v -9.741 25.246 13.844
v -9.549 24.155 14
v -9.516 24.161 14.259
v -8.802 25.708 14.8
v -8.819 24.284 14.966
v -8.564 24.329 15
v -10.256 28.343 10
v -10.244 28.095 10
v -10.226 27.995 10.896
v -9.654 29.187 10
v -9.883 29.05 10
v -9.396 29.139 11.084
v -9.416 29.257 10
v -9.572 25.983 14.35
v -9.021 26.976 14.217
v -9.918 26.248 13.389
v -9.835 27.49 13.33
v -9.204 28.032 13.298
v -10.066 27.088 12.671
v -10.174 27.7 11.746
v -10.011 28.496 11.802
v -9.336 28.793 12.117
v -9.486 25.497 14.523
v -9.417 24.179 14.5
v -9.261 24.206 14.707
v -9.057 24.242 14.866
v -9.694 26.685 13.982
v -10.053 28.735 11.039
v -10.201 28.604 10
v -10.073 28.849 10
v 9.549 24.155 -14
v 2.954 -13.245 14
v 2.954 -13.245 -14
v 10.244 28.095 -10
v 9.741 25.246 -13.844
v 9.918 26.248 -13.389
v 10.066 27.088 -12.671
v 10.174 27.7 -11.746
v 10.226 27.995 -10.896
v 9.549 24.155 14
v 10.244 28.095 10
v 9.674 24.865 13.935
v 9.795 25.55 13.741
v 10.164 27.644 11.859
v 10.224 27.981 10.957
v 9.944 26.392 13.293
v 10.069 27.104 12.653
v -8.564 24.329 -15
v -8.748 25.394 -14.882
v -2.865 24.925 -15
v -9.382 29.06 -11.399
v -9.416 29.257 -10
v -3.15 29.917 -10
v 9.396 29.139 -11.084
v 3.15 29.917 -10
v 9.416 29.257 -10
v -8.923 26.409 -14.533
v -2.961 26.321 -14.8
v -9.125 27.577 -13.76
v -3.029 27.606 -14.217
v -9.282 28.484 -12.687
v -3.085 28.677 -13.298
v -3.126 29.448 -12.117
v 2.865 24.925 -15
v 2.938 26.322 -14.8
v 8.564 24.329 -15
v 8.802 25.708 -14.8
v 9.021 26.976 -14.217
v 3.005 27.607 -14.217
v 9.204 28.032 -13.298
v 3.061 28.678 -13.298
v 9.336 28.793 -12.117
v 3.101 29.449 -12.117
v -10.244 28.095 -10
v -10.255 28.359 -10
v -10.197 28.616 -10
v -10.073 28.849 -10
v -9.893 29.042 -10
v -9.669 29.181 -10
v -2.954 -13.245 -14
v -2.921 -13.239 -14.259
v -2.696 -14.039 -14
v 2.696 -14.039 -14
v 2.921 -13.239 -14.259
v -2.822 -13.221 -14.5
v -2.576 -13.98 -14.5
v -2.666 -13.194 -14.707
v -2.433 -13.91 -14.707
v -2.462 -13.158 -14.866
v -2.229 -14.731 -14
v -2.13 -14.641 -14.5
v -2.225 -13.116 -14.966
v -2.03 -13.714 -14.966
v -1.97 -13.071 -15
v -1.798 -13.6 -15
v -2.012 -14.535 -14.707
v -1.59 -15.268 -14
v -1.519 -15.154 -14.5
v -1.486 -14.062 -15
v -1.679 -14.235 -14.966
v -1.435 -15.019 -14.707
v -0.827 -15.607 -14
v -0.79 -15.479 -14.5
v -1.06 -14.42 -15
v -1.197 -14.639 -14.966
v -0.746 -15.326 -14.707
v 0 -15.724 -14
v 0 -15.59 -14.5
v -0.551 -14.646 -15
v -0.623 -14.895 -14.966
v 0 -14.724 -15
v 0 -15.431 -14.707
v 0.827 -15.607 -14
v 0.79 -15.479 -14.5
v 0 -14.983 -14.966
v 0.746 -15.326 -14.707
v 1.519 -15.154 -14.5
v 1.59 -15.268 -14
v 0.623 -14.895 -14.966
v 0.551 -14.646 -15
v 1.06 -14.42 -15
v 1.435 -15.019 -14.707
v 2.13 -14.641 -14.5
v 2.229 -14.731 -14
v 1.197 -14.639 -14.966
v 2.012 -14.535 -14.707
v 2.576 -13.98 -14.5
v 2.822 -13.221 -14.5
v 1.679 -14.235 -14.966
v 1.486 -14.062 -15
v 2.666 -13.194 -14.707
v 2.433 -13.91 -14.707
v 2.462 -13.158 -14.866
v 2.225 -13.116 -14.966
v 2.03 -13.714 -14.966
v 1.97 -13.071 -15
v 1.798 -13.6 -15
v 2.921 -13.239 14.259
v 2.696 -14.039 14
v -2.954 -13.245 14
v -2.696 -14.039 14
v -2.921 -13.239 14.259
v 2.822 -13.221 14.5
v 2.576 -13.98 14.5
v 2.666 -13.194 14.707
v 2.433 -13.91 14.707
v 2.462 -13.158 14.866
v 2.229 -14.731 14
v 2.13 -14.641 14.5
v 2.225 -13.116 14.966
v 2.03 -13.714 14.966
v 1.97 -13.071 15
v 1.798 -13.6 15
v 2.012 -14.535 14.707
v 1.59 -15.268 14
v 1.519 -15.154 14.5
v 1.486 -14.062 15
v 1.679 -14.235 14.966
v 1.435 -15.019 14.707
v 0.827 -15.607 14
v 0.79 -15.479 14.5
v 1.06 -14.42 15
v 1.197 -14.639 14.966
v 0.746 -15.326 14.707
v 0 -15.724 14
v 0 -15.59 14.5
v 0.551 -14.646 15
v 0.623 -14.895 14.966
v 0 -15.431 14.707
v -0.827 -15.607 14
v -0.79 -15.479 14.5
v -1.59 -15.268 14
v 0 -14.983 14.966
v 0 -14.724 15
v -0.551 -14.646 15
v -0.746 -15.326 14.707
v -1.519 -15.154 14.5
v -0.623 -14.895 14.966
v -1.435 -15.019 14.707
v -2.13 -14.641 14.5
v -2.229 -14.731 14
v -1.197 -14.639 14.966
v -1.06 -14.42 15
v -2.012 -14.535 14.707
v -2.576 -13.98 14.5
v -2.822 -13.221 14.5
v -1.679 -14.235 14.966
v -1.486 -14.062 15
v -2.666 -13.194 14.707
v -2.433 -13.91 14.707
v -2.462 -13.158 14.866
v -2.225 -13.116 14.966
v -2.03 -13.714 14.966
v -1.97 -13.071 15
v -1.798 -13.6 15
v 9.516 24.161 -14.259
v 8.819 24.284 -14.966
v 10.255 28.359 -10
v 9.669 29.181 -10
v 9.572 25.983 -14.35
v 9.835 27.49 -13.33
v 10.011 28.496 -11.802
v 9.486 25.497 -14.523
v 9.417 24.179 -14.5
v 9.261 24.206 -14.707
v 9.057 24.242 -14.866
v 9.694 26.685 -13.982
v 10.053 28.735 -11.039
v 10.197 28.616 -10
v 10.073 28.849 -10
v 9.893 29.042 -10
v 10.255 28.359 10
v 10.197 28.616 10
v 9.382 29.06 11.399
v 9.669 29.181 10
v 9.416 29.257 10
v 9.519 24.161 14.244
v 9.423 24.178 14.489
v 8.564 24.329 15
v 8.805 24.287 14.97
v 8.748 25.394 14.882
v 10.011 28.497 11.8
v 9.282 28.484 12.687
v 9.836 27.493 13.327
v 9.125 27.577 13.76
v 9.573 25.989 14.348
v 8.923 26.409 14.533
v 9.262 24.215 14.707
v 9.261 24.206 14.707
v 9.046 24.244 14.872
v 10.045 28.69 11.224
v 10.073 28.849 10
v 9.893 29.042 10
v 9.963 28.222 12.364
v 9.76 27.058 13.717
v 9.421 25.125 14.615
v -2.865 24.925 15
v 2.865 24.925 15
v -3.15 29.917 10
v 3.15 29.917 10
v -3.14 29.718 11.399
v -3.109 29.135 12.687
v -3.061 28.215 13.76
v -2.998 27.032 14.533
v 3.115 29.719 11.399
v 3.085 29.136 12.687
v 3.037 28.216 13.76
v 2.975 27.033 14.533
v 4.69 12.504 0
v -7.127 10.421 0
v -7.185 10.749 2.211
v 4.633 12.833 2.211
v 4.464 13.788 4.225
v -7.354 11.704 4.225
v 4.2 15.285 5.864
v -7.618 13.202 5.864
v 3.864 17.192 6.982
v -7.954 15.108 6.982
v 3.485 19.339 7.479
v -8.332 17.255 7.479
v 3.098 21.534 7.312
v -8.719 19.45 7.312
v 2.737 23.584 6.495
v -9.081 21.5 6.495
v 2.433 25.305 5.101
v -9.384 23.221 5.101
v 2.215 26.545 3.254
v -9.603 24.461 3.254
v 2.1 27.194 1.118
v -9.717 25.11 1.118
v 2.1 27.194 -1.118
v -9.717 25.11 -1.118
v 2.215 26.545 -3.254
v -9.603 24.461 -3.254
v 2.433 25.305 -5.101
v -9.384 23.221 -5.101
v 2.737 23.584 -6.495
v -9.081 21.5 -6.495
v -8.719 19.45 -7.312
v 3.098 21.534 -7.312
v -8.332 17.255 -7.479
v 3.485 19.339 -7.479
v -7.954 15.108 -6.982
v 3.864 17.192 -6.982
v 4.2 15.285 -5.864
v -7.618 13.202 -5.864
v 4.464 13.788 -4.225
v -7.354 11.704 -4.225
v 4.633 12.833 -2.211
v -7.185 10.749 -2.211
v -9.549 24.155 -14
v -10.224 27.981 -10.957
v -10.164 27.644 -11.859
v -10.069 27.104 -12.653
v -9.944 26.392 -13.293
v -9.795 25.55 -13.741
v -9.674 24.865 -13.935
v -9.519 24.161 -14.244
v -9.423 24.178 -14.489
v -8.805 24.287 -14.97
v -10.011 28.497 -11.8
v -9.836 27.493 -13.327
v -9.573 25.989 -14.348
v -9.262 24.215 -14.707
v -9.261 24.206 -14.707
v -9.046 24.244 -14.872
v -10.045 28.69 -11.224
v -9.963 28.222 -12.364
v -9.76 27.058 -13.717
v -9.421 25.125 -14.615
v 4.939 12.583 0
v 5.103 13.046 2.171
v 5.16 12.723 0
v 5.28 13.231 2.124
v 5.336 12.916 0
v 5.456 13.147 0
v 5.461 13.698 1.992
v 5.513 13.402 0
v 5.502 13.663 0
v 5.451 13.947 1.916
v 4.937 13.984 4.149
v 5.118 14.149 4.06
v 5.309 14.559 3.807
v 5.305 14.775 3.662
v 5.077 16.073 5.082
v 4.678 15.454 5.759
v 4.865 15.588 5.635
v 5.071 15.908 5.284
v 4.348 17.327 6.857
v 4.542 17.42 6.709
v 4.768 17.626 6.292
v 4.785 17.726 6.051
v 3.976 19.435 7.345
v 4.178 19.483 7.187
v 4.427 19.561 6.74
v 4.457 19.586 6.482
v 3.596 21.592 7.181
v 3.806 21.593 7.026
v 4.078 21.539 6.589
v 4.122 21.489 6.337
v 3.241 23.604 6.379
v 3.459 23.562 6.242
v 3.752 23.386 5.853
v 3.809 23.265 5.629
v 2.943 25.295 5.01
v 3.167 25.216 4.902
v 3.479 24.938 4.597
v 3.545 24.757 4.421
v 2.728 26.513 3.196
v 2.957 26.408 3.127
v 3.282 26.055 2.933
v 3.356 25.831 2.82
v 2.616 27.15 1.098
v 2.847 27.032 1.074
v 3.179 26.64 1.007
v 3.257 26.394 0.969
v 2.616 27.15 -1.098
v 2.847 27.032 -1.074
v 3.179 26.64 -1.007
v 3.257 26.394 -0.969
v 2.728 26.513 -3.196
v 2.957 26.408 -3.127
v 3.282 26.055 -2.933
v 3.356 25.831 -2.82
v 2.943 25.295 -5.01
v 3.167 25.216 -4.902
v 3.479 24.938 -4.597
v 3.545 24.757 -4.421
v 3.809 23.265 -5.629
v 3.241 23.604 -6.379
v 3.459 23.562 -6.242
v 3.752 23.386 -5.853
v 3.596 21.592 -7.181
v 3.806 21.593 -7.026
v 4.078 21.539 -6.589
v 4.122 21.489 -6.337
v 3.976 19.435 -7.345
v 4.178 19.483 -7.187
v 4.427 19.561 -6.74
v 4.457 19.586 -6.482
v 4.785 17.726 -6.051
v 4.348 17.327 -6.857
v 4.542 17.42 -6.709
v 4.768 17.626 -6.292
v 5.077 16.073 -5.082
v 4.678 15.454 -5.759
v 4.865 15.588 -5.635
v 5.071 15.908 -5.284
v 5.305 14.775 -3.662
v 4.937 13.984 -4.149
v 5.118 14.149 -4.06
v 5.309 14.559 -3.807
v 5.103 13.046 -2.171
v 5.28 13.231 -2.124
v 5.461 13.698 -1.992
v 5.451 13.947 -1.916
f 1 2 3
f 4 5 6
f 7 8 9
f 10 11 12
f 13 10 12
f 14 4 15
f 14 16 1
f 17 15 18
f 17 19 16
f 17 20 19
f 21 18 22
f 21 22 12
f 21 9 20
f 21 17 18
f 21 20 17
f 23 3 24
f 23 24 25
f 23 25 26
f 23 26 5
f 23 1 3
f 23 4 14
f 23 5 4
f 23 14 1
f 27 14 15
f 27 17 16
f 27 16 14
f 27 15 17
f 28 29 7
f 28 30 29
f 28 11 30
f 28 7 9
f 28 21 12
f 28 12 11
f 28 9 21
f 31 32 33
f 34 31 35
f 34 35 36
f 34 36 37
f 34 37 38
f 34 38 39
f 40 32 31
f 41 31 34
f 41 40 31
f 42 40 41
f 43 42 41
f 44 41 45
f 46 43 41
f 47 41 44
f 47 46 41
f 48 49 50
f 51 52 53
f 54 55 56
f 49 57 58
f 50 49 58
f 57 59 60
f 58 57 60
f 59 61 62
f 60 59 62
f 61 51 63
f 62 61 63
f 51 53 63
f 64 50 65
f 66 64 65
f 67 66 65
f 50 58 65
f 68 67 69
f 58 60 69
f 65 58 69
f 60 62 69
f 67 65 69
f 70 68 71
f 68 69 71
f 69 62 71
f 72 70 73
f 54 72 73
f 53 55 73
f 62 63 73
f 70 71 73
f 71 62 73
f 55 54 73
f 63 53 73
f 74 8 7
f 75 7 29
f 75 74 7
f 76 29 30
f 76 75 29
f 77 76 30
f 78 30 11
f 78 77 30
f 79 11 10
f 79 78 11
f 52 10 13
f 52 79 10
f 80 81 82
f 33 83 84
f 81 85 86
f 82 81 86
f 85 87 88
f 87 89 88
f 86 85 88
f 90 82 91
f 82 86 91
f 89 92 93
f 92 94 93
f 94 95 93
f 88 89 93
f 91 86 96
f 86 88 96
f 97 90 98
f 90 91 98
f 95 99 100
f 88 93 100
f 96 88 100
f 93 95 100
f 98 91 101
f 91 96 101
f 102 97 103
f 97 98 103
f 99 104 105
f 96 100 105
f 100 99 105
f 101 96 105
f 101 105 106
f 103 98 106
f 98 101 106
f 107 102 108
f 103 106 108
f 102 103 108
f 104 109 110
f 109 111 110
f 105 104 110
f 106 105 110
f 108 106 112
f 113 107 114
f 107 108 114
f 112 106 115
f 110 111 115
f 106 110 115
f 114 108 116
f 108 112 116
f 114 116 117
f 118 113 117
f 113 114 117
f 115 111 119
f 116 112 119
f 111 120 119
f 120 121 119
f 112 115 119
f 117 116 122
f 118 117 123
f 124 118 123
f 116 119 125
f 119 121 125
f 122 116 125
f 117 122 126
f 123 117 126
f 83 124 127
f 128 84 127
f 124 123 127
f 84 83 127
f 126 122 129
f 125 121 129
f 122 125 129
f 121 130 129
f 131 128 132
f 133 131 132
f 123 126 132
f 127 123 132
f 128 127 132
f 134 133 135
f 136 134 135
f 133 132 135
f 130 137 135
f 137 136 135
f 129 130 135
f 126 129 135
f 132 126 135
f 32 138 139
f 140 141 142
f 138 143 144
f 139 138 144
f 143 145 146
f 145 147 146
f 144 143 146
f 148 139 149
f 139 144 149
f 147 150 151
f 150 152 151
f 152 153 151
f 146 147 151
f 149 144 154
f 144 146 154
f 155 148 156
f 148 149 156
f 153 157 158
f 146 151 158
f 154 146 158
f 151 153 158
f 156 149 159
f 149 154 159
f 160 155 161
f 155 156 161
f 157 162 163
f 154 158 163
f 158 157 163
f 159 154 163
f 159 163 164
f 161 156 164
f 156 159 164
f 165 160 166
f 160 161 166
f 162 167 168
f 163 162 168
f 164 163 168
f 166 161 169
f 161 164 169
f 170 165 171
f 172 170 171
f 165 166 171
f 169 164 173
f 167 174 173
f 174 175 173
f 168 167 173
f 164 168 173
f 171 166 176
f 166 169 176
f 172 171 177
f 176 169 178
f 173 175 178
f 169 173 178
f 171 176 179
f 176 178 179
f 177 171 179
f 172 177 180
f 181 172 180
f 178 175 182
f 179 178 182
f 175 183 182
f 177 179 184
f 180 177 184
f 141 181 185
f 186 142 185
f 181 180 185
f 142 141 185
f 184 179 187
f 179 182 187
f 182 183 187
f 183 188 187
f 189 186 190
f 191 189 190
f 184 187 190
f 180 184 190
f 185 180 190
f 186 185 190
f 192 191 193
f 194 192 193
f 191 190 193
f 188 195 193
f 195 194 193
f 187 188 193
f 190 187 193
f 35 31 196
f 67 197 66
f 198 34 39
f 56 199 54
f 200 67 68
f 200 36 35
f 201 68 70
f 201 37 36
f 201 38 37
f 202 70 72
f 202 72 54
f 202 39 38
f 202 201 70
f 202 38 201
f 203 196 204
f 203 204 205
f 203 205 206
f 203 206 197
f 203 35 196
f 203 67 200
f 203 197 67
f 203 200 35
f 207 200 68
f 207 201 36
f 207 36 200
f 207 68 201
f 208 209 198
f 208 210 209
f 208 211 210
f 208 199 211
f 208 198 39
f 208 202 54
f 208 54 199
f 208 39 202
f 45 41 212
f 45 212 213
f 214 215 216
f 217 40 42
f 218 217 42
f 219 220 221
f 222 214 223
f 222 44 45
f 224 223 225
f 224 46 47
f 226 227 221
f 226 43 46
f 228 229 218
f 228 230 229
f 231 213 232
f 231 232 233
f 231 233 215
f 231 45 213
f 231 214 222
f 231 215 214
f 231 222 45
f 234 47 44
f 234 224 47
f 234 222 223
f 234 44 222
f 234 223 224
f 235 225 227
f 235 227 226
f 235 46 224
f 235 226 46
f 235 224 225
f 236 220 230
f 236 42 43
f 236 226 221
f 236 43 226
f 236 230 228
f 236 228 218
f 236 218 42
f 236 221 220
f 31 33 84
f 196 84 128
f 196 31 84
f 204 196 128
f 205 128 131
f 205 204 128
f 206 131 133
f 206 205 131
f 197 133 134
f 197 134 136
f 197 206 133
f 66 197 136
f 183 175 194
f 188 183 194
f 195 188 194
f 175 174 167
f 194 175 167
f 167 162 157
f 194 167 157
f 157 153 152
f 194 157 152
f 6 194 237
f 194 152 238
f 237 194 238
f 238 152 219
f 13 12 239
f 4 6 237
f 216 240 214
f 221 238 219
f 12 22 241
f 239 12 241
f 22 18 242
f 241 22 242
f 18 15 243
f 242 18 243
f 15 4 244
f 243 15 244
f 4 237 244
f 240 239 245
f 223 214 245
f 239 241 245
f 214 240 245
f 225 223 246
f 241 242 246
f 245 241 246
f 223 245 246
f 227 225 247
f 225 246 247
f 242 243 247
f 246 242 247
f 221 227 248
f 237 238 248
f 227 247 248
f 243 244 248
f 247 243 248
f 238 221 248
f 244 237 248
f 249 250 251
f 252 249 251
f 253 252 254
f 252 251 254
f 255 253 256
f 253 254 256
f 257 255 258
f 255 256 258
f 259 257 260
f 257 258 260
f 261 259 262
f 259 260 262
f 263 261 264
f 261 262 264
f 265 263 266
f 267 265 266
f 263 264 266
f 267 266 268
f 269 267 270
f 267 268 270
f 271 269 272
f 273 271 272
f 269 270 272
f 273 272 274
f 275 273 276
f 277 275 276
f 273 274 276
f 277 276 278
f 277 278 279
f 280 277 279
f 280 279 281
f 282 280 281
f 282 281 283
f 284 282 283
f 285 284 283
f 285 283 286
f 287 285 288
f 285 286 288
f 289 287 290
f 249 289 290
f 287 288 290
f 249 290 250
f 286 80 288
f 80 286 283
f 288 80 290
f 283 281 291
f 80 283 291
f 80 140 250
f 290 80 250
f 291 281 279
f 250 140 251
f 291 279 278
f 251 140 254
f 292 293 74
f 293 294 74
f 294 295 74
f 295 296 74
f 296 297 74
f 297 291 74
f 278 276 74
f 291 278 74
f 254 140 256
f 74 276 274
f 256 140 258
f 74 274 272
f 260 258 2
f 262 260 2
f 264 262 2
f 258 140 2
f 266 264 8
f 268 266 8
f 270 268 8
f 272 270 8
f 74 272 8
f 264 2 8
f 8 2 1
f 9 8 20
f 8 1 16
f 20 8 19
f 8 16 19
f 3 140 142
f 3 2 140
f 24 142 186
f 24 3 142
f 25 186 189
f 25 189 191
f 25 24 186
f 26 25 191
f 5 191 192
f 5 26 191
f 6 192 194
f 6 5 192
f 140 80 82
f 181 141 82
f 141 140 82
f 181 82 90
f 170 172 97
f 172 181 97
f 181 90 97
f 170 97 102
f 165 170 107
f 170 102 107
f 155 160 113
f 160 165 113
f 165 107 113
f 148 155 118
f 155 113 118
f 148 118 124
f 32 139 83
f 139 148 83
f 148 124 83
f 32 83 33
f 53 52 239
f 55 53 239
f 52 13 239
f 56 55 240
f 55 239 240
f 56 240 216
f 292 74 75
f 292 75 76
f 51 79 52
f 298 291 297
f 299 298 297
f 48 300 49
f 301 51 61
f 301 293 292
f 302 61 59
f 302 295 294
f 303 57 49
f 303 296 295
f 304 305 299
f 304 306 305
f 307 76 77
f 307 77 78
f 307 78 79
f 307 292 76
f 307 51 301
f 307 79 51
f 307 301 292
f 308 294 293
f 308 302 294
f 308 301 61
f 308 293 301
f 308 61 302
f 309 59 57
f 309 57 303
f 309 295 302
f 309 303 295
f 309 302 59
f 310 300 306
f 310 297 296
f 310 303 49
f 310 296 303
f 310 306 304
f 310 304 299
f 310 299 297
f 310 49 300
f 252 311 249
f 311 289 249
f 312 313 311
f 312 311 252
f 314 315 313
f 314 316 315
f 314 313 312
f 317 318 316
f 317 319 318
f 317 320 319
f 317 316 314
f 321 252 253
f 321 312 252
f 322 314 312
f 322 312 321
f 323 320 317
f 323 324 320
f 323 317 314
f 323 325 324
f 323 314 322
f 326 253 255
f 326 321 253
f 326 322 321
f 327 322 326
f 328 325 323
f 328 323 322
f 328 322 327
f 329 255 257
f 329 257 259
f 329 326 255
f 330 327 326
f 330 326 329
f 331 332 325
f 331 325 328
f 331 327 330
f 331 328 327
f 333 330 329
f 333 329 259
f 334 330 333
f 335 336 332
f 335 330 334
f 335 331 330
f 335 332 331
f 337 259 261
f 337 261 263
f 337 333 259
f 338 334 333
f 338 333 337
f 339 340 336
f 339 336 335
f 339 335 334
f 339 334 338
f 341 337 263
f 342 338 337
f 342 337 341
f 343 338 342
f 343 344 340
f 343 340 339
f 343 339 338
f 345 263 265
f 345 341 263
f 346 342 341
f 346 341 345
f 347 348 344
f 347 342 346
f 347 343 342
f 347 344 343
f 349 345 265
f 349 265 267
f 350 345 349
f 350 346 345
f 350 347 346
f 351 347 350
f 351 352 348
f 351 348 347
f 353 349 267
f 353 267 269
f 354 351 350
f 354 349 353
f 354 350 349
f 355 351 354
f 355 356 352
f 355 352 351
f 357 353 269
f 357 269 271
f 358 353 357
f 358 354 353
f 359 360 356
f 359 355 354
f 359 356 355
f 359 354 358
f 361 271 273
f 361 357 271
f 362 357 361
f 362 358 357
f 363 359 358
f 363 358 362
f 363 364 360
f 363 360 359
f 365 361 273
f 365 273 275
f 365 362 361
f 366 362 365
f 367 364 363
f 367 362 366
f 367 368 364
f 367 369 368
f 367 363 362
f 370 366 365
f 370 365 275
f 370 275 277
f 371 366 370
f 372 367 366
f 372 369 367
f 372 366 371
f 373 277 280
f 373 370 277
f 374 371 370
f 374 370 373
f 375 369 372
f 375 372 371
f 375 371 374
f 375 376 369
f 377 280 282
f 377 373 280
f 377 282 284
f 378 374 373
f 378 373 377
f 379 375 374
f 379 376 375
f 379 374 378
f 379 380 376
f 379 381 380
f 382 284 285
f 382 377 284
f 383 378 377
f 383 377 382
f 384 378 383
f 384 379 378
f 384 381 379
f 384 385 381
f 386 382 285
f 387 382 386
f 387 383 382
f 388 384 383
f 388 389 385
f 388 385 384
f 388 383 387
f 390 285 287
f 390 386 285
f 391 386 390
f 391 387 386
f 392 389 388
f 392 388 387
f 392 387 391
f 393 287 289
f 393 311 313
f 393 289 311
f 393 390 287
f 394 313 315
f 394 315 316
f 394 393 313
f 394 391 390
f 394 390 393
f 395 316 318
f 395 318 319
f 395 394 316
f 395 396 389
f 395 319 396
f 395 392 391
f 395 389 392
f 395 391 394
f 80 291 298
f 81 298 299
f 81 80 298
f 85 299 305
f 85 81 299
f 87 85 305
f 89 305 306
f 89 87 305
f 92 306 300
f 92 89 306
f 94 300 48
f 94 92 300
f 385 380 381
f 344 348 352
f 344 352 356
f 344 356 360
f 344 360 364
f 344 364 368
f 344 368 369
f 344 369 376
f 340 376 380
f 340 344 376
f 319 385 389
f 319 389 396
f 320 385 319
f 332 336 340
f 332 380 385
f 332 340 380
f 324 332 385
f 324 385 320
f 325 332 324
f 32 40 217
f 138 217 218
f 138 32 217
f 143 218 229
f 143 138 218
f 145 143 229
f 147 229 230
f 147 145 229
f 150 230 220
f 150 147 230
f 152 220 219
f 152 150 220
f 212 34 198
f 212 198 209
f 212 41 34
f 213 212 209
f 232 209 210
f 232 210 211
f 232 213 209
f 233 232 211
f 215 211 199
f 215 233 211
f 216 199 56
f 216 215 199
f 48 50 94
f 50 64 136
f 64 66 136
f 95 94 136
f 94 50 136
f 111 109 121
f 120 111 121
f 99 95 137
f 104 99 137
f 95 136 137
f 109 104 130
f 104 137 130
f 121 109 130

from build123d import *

# Parameters (mm, degrees)
F1_ANGLE_BACK = 10
F1_ANGLE      = 20
F2_R          = 3
F3_R          = 7.5
F4_DEPTH      = 13
F5_R          = 1


with BuildPart() as f1:
    # F0 (on Right) → F1 (revolve)
    with BuildSketch(Plane.YZ, mode=Mode.PRIVATE) as f1_sk:
        with BuildLine():
            ThreePointArc((30, 10), (28.5355339059, 13.5355339059), (25, 15))
            Line((25, 15), (-30, 15))
            Line((-30, 15), (-30, -15))
            Line((-30, -15), (25, -15))
            ThreePointArc((25, -15), (28.5355339059, -13.5355339059), (30, -10))
            Line((30, -10), (30, 10))
        make_face()
    revolve(f1_sk.sketch.rotate(Axis((0, -30, 0), (0, 0, -1)), -F1_ANGLE_BACK), axis=Axis((0, -30, 0), (0, 0, -1)), revolution_arc=F1_ANGLE)

    # F2
    f2_edges = [f1.edges().sort_by_distance(p)[0] for p in [
        (0, -30, 0),
    ]]
    fillet(f2_edges, radius=F2_R)

    # F3 (on face) → F4 (cut)
    with BuildSketch(Plane(origin=(-5.1303021499, -0.9046106882, 0), x_dir=(0.1736481777, -0.984807753, 0), z_dir=(-0.984807753, -0.1736481777, 0))):
        with Locations((-19, 0)):
            Circle(F3_R)
    extrude(amount=-F4_DEPTH, mode=Mode.SUBTRACT)

    # F5
    f5_edges = [f1.edges().sort_by_distance(p)[0] for p in [
        (10.164589, 27.646248, -13.535534),
        (3.070522, 27.450221, 0),
    ]]
    fillet(f5_edges, radius=F5_R)


solid = f1.part
